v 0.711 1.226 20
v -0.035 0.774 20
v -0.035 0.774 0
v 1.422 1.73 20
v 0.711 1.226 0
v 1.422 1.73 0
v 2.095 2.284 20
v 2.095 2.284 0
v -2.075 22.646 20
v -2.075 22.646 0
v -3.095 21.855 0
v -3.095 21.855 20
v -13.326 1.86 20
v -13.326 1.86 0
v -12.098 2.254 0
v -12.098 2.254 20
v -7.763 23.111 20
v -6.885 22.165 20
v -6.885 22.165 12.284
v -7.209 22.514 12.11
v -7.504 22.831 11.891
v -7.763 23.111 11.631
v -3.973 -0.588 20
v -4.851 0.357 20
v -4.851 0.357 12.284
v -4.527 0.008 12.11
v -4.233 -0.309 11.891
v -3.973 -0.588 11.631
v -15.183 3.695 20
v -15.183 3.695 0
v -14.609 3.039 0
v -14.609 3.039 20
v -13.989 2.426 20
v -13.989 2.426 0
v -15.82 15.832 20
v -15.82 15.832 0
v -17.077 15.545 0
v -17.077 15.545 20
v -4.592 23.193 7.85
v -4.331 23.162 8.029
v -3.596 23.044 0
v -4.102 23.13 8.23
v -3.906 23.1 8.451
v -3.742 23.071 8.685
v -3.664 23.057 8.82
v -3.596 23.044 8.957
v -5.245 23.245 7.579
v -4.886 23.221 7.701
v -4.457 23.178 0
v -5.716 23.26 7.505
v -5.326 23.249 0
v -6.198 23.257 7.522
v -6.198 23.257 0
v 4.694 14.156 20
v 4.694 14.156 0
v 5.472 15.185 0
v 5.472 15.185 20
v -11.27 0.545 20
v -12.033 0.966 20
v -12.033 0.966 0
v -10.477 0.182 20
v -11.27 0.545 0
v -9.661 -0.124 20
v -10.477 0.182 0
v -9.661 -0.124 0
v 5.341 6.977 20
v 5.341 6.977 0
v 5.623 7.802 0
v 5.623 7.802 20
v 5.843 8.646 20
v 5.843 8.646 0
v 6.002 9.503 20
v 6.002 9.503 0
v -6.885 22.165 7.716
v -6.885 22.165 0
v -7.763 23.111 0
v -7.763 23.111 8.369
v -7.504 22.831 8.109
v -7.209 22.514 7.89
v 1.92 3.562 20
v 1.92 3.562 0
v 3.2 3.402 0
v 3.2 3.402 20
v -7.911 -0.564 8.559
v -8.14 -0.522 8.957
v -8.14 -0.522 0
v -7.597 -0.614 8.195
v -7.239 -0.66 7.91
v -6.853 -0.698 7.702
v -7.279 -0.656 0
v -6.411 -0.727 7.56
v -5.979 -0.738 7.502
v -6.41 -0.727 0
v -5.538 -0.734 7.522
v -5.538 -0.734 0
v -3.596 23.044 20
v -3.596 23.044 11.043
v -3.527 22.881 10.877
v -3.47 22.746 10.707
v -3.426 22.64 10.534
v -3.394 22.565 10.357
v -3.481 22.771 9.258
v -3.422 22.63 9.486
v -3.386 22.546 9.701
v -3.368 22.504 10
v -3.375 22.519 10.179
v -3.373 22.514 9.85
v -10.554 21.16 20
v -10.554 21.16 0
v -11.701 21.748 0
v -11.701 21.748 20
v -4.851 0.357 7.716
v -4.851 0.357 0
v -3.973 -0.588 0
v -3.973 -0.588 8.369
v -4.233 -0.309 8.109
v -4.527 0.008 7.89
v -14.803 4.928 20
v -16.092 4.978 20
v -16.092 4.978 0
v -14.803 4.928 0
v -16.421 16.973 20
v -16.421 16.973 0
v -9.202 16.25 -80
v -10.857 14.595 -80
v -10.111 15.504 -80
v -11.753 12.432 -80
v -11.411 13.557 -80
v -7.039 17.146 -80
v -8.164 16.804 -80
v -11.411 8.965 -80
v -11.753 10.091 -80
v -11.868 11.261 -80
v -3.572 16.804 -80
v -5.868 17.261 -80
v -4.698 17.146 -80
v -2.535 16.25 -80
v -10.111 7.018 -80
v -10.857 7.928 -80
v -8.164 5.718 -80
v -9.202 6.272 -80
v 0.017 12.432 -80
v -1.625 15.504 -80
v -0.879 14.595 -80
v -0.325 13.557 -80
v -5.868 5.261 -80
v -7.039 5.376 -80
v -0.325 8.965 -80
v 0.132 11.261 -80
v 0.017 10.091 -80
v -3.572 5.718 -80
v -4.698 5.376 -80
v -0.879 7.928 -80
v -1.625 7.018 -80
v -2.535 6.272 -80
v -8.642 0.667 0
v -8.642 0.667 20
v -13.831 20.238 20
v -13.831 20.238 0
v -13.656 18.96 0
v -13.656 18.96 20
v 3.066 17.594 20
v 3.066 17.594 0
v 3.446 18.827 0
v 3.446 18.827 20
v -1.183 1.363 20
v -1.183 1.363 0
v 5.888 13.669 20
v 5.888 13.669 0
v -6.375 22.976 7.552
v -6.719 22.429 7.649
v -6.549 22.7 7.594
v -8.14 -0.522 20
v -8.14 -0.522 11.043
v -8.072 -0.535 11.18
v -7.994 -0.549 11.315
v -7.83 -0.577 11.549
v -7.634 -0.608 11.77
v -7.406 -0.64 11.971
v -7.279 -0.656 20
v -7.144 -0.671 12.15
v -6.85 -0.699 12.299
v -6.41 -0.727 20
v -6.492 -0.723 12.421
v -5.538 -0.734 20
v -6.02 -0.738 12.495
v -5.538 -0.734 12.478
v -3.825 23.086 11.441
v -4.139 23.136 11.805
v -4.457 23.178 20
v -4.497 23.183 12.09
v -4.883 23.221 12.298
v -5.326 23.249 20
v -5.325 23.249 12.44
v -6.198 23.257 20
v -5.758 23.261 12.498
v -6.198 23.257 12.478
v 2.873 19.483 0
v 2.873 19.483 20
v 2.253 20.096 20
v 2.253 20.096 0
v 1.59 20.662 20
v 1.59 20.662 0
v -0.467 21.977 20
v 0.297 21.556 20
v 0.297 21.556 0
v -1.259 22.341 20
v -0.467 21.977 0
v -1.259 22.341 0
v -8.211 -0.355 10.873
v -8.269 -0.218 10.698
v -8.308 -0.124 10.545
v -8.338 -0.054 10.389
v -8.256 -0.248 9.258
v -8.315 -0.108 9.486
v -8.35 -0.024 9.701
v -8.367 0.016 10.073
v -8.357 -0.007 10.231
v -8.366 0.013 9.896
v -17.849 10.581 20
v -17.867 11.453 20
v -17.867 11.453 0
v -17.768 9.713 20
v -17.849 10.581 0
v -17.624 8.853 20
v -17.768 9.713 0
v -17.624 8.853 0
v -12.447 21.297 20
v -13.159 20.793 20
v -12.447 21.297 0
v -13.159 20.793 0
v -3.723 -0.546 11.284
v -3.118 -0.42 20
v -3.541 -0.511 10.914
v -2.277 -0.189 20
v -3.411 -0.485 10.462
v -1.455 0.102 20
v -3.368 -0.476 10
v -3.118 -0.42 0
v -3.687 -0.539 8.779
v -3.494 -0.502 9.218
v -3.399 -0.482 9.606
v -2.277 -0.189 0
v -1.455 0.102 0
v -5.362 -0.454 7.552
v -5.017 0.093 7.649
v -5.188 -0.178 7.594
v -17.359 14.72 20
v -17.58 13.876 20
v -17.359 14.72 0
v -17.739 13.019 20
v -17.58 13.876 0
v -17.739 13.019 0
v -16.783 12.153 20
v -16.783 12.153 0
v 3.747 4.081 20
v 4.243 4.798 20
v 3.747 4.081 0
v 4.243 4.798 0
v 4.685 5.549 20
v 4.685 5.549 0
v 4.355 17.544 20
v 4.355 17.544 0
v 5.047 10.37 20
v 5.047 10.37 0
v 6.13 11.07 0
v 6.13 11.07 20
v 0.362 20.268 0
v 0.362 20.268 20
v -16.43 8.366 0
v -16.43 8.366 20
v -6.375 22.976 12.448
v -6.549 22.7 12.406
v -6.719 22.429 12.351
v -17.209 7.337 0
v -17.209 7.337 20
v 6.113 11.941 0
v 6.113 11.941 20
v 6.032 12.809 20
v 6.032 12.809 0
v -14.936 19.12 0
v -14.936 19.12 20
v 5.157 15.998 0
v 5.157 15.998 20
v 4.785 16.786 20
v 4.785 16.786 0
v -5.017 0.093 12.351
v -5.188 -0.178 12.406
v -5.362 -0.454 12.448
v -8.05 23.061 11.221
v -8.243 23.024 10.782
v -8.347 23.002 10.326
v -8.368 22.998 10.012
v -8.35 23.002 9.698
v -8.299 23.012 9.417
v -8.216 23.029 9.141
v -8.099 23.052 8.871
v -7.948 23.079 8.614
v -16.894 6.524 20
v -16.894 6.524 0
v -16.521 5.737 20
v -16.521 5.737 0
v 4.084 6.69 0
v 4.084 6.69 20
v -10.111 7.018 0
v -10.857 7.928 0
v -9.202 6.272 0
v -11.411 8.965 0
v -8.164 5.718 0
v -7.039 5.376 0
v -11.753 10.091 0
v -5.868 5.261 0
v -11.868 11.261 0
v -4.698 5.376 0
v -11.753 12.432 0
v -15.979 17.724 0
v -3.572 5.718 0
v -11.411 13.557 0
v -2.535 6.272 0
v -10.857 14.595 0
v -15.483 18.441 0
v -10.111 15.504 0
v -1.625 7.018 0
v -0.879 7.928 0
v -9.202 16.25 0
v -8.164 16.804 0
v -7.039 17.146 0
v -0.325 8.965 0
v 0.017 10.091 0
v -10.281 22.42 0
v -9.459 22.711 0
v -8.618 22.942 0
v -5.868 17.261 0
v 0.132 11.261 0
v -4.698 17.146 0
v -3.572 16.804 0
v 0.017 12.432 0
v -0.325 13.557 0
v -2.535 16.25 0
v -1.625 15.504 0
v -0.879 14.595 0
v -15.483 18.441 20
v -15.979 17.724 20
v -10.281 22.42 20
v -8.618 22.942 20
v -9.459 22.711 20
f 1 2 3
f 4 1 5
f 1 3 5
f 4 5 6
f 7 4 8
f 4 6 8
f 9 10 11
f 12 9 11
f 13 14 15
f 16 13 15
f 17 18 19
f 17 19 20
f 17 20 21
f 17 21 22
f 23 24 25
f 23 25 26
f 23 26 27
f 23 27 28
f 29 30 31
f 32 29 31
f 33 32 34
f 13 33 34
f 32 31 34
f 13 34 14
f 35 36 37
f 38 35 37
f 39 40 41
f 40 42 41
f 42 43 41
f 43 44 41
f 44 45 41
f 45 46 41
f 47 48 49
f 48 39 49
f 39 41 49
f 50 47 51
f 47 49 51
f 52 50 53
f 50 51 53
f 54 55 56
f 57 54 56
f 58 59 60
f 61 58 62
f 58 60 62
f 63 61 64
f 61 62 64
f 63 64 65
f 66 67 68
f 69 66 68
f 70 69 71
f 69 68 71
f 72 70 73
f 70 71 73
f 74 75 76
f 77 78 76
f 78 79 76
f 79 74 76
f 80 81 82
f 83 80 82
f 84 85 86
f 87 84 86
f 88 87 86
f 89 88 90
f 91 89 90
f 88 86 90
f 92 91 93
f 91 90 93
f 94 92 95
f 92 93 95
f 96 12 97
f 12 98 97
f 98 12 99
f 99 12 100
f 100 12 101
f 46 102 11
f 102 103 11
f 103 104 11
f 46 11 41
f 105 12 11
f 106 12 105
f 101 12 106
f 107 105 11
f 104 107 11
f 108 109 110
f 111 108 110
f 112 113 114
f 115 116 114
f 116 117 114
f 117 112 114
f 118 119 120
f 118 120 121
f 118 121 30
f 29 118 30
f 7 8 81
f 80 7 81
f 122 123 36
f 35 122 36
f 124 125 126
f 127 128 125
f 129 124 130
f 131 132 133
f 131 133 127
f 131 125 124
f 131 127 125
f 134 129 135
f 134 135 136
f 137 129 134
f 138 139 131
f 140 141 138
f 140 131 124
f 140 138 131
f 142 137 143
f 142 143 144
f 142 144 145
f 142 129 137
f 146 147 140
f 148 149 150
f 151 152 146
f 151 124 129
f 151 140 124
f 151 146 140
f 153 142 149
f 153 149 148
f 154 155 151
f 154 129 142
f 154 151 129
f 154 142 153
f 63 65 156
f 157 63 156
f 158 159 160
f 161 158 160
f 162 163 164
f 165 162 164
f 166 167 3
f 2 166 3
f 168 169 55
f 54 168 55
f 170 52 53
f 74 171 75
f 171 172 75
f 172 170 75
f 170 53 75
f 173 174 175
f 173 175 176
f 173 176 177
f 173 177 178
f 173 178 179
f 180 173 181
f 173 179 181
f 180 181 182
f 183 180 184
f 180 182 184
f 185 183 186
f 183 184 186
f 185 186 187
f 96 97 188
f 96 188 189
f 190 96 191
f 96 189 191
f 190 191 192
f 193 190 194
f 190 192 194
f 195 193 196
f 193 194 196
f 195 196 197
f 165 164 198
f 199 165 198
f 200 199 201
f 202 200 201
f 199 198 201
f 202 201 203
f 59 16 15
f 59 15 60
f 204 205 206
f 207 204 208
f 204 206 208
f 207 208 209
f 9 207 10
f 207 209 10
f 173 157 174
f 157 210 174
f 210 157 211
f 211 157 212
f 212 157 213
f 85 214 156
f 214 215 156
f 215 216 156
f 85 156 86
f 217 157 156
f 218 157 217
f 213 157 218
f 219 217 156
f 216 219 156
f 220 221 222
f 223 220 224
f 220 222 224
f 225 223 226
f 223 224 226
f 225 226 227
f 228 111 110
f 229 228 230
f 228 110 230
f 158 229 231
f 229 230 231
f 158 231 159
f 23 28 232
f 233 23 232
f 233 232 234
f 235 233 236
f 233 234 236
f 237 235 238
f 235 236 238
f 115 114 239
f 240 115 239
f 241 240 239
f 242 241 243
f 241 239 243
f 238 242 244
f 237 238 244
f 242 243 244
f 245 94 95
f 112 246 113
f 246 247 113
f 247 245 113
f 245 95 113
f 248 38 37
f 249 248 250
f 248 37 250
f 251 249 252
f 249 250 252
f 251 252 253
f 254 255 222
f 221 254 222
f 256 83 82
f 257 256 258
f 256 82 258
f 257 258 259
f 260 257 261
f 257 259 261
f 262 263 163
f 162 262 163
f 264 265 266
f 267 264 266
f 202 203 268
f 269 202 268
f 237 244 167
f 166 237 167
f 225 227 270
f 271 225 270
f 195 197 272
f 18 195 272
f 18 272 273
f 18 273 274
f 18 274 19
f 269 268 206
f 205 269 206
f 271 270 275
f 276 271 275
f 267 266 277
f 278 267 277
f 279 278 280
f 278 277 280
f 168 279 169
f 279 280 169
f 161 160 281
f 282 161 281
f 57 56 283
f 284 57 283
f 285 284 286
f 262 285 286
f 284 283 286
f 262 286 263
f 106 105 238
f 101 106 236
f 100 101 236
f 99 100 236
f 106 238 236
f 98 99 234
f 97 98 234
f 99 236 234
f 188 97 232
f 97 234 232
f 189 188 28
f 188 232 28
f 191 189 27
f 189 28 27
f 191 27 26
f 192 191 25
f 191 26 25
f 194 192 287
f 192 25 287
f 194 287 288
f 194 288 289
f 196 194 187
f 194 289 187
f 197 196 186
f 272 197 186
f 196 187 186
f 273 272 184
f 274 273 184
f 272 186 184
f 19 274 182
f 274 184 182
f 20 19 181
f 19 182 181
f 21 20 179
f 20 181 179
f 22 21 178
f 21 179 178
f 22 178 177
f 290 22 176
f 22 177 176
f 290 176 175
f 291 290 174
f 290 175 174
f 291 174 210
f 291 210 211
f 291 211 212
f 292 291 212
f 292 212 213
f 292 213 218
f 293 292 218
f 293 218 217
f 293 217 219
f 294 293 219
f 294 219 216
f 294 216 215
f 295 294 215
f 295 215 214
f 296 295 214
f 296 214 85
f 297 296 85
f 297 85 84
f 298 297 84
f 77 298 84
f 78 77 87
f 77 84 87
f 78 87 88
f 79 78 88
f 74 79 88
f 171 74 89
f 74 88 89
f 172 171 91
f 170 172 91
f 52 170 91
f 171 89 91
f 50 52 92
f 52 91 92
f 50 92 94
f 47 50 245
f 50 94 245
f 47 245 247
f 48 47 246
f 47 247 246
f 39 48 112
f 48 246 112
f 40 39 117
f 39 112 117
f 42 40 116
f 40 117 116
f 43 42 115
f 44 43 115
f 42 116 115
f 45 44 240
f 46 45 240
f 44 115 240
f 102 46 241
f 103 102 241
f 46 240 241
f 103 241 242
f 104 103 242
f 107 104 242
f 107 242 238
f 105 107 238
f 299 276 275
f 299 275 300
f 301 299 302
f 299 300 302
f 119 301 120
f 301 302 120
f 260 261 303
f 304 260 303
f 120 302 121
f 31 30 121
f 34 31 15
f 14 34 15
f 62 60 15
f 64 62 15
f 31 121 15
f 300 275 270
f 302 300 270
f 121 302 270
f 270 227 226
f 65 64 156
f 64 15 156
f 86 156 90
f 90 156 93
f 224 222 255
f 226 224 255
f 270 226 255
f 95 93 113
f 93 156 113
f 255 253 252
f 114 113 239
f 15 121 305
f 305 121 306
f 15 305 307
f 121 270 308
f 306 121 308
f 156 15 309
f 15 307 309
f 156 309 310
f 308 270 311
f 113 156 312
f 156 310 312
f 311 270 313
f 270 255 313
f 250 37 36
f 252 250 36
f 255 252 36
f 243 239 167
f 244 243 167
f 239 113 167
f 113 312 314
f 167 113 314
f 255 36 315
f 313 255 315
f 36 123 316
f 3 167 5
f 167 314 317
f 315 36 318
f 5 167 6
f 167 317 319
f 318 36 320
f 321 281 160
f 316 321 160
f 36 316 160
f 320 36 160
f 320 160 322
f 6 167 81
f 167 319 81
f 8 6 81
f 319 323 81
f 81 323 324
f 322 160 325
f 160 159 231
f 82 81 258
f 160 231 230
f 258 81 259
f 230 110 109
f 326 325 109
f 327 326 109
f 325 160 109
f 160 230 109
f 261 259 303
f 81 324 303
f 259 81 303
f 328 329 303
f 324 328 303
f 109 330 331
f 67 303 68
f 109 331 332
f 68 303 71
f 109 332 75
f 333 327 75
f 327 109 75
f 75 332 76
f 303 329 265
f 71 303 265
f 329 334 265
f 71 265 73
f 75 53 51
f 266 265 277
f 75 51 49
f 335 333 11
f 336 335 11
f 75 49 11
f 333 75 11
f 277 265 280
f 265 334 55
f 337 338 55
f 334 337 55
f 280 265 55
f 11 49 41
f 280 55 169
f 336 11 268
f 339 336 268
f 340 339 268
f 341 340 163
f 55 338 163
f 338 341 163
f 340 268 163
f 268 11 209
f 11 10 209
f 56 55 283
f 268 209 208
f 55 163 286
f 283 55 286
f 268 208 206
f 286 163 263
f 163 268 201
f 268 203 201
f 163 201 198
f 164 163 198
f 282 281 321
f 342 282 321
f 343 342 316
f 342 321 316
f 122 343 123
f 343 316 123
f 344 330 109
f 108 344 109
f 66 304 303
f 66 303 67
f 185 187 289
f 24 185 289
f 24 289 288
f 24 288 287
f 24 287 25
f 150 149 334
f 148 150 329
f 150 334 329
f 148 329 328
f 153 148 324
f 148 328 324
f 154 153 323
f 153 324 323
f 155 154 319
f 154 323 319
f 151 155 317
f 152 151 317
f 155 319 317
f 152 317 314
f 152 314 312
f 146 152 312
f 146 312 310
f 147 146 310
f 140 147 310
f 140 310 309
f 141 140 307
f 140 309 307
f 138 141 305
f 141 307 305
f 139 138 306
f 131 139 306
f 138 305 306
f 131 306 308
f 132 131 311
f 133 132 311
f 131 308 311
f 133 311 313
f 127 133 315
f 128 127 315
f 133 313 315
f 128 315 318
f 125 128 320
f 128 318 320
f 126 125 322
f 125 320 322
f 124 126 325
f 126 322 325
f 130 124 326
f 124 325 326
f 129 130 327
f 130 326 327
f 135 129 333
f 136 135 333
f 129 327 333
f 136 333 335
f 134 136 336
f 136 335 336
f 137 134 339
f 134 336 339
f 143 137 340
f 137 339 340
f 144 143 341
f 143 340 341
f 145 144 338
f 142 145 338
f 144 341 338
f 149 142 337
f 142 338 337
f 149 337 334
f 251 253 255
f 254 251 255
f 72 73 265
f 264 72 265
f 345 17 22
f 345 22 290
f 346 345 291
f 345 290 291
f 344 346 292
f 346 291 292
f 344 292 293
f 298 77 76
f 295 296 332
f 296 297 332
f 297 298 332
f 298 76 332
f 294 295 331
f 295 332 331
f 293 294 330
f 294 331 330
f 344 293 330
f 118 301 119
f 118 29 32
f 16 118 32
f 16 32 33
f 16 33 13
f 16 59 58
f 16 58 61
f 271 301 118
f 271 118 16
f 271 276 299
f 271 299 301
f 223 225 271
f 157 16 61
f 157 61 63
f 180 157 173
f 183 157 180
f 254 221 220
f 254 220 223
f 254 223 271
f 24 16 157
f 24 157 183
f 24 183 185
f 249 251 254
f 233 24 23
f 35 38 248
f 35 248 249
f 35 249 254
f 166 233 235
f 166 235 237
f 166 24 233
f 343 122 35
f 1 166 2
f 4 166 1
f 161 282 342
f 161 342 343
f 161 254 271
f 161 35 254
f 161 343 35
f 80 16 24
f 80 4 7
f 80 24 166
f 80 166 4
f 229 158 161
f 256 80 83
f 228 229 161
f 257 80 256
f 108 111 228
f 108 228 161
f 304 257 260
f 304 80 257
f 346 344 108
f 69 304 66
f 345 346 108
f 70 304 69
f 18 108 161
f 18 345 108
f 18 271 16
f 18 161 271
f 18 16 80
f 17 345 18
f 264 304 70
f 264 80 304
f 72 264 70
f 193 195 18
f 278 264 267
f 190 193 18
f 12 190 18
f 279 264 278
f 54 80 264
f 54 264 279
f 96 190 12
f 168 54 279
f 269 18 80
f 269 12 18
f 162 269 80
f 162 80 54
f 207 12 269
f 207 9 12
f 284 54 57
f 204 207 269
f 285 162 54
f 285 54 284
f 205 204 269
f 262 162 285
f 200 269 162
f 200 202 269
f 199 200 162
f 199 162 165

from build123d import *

# Parameters (mm, degrees)
F1_DEPTH = 20
F3_R     = 2.5
F4_DEPTH = 48.262108
F5_R     = 6
F6_DEPTH = 80


with BuildPart() as f1:
    # F0 (on Top) → F1 (new body)
    with BuildSketch(Plane.XY):
        with BuildLine():
            Line((-10.553502, 21.159582), (-11.701467, 21.747872))
            ThreePointArc((-11.701467, 21.747872), (-12.807584, 21.051104), (-13.831344, 20.23815))
            Line((-13.831344, 20.23815), (-13.656418, 18.96014))
            Line((-13.656418, 18.96014), (-14.936359, 19.120325))
            ThreePointArc((-14.936359, 19.120325), (-15.73746, 18.087264), (-16.421432, 16.97319))
            Line((-16.421432, 16.97319), (-15.819951, 15.832082))
            Line((-15.819951, 15.832082), (-17.077488, 15.544841))
            ThreePointArc((-17.077488, 15.544841), (-17.476949, 14.300088), (-17.738638, 13.019269))
            Line((-17.738638, 13.019269), (-16.783148, 12.152696))
            Line((-16.783148, 12.152696), (-17.866604, 11.452675))
            ThreePointArc((-17.866604, 11.452675), (-17.816244, 10.146366), (-17.624085, 8.853287))
            Line((-17.624085, 8.853287), (-16.429833, 8.365772))
            Line((-16.429833, 8.365772), (-17.208528, 7.337403))
            ThreePointArc((-17.208528, 7.337403), (-16.714421, 6.127099), (-16.091591, 4.977724))
            Line((-16.091591, 4.977724), (-14.802622, 4.928068))
            Line((-14.802622, 4.928068), (-15.182632, 3.695388))
            ThreePointArc((-15.182632, 3.695388), (-14.304375, 2.727069), (-13.325997, 1.86003))
            Line((-13.325997, 1.86003), (-12.097779, 2.254223))
            Line((-12.097779, 2.254223), (-12.033271, 0.965911))
            ThreePointArc((-12.033271, 0.965911), (-10.876794, 0.35637), (-9.660875, -0.123755))
            Line((-9.660875, -0.123755), (-8.641549, 0.66674))
            Line((-8.641549, 0.66674), (-8.140303, -0.521814))
            ThreePointArc((-8.140303, -0.521814), (-6.845095, -0.699057), (-5.538292, -0.734358))
            Line((-5.538292, -0.734358), (-4.850804, 0.357095))
            Line((-4.850804, 0.357095), (-3.973277, -0.588344))
            ThreePointArc((-3.973277, -0.588344), (-2.695559, -0.311911), (-1.455493, 0.101869))
            Line((-1.455493, 0.101869), (-1.182765, 1.362634))
            Line((-1.182765, 1.362634), (-0.0348, 0.774344))
            ThreePointArc((-0.0348, 0.774344), (1.071317, 1.471112), (2.095076, 2.284066))
            Line((2.095076, 2.284066), (1.92015, 3.562076))
            Line((1.92015, 3.562076), (3.200092, 3.401891))
            ThreePointArc((3.200092, 3.401891), (4.001193, 4.434952), (4.685165, 5.549026))
            Line((4.685165, 5.549026), (4.083684, 6.690134))
            Line((4.083684, 6.690134), (5.341221, 6.977375))
            ThreePointArc((5.341221, 6.977375), (5.740682, 8.222128), (6.002371, 9.502947))
            Line((6.002371, 9.502947), (5.046881, 10.36952))
            Line((5.046881, 10.36952), (6.130337, 11.069541))
            ThreePointArc((6.130337, 11.069541), (6.079977, 12.37585), (5.887818, 13.668929))
            Line((5.887818, 13.668929), (4.693566, 14.156444))
            Line((4.693566, 14.156444), (5.472261, 15.184813))
            ThreePointArc((5.472261, 15.184813), (4.978154, 16.395117), (4.355324, 17.544492))
            Line((4.355324, 17.544492), (3.066354, 17.594148))
            Line((3.066354, 17.594148), (3.446365, 18.826828))
            ThreePointArc((3.446365, 18.826828), (2.568108, 19.795147), (1.58973, 20.662186))
            Line((1.58973, 20.662186), (0.361512, 20.267993))
            Line((0.361512, 20.267993), (0.297004, 21.556305))
            ThreePointArc((0.297004, 21.556305), (-0.859473, 22.165846), (-2.075392, 22.645971))
            Line((-2.075392, 22.645971), (-3.094718, 21.855476))
            Line((-3.094718, 21.855476), (-3.595965, 23.04403))
            ThreePointArc((-3.595965, 23.04403), (-4.891172, 23.221273), (-6.197975, 23.256574))
            Line((-6.197975, 23.256574), (-6.885463, 22.165121))
            Line((-6.885463, 22.165121), (-7.76299, 23.11056))
            ThreePointArc((-7.76299, 23.11056), (-9.040708, 22.834127), (-10.280774, 22.420347))
            Line((-10.280774, 22.420347), (-10.553502, 21.159582))
        make_face()
    extrude(amount=F1_DEPTH)

    # F3 (on offset) → F4 (cut, through all)
    with BuildSketch(Plane.XZ.offset(25)):
        with Locations((-5.868134, 10)):
            Circle(F3_R)
    extrude(amount=-F4_DEPTH, mode=Mode.SUBTRACT)

    # F5 (on face) → F6 (join)
    with BuildSketch(Plane(origin=(0, 0, 0), x_dir=(1, 0, 0), z_dir=(0, 0, -1))):
        with Locations((-5.868134, -11.261108)):
            Circle(F5_R)
    extrude(amount=F6_DEPTH)


solid = f1.part
